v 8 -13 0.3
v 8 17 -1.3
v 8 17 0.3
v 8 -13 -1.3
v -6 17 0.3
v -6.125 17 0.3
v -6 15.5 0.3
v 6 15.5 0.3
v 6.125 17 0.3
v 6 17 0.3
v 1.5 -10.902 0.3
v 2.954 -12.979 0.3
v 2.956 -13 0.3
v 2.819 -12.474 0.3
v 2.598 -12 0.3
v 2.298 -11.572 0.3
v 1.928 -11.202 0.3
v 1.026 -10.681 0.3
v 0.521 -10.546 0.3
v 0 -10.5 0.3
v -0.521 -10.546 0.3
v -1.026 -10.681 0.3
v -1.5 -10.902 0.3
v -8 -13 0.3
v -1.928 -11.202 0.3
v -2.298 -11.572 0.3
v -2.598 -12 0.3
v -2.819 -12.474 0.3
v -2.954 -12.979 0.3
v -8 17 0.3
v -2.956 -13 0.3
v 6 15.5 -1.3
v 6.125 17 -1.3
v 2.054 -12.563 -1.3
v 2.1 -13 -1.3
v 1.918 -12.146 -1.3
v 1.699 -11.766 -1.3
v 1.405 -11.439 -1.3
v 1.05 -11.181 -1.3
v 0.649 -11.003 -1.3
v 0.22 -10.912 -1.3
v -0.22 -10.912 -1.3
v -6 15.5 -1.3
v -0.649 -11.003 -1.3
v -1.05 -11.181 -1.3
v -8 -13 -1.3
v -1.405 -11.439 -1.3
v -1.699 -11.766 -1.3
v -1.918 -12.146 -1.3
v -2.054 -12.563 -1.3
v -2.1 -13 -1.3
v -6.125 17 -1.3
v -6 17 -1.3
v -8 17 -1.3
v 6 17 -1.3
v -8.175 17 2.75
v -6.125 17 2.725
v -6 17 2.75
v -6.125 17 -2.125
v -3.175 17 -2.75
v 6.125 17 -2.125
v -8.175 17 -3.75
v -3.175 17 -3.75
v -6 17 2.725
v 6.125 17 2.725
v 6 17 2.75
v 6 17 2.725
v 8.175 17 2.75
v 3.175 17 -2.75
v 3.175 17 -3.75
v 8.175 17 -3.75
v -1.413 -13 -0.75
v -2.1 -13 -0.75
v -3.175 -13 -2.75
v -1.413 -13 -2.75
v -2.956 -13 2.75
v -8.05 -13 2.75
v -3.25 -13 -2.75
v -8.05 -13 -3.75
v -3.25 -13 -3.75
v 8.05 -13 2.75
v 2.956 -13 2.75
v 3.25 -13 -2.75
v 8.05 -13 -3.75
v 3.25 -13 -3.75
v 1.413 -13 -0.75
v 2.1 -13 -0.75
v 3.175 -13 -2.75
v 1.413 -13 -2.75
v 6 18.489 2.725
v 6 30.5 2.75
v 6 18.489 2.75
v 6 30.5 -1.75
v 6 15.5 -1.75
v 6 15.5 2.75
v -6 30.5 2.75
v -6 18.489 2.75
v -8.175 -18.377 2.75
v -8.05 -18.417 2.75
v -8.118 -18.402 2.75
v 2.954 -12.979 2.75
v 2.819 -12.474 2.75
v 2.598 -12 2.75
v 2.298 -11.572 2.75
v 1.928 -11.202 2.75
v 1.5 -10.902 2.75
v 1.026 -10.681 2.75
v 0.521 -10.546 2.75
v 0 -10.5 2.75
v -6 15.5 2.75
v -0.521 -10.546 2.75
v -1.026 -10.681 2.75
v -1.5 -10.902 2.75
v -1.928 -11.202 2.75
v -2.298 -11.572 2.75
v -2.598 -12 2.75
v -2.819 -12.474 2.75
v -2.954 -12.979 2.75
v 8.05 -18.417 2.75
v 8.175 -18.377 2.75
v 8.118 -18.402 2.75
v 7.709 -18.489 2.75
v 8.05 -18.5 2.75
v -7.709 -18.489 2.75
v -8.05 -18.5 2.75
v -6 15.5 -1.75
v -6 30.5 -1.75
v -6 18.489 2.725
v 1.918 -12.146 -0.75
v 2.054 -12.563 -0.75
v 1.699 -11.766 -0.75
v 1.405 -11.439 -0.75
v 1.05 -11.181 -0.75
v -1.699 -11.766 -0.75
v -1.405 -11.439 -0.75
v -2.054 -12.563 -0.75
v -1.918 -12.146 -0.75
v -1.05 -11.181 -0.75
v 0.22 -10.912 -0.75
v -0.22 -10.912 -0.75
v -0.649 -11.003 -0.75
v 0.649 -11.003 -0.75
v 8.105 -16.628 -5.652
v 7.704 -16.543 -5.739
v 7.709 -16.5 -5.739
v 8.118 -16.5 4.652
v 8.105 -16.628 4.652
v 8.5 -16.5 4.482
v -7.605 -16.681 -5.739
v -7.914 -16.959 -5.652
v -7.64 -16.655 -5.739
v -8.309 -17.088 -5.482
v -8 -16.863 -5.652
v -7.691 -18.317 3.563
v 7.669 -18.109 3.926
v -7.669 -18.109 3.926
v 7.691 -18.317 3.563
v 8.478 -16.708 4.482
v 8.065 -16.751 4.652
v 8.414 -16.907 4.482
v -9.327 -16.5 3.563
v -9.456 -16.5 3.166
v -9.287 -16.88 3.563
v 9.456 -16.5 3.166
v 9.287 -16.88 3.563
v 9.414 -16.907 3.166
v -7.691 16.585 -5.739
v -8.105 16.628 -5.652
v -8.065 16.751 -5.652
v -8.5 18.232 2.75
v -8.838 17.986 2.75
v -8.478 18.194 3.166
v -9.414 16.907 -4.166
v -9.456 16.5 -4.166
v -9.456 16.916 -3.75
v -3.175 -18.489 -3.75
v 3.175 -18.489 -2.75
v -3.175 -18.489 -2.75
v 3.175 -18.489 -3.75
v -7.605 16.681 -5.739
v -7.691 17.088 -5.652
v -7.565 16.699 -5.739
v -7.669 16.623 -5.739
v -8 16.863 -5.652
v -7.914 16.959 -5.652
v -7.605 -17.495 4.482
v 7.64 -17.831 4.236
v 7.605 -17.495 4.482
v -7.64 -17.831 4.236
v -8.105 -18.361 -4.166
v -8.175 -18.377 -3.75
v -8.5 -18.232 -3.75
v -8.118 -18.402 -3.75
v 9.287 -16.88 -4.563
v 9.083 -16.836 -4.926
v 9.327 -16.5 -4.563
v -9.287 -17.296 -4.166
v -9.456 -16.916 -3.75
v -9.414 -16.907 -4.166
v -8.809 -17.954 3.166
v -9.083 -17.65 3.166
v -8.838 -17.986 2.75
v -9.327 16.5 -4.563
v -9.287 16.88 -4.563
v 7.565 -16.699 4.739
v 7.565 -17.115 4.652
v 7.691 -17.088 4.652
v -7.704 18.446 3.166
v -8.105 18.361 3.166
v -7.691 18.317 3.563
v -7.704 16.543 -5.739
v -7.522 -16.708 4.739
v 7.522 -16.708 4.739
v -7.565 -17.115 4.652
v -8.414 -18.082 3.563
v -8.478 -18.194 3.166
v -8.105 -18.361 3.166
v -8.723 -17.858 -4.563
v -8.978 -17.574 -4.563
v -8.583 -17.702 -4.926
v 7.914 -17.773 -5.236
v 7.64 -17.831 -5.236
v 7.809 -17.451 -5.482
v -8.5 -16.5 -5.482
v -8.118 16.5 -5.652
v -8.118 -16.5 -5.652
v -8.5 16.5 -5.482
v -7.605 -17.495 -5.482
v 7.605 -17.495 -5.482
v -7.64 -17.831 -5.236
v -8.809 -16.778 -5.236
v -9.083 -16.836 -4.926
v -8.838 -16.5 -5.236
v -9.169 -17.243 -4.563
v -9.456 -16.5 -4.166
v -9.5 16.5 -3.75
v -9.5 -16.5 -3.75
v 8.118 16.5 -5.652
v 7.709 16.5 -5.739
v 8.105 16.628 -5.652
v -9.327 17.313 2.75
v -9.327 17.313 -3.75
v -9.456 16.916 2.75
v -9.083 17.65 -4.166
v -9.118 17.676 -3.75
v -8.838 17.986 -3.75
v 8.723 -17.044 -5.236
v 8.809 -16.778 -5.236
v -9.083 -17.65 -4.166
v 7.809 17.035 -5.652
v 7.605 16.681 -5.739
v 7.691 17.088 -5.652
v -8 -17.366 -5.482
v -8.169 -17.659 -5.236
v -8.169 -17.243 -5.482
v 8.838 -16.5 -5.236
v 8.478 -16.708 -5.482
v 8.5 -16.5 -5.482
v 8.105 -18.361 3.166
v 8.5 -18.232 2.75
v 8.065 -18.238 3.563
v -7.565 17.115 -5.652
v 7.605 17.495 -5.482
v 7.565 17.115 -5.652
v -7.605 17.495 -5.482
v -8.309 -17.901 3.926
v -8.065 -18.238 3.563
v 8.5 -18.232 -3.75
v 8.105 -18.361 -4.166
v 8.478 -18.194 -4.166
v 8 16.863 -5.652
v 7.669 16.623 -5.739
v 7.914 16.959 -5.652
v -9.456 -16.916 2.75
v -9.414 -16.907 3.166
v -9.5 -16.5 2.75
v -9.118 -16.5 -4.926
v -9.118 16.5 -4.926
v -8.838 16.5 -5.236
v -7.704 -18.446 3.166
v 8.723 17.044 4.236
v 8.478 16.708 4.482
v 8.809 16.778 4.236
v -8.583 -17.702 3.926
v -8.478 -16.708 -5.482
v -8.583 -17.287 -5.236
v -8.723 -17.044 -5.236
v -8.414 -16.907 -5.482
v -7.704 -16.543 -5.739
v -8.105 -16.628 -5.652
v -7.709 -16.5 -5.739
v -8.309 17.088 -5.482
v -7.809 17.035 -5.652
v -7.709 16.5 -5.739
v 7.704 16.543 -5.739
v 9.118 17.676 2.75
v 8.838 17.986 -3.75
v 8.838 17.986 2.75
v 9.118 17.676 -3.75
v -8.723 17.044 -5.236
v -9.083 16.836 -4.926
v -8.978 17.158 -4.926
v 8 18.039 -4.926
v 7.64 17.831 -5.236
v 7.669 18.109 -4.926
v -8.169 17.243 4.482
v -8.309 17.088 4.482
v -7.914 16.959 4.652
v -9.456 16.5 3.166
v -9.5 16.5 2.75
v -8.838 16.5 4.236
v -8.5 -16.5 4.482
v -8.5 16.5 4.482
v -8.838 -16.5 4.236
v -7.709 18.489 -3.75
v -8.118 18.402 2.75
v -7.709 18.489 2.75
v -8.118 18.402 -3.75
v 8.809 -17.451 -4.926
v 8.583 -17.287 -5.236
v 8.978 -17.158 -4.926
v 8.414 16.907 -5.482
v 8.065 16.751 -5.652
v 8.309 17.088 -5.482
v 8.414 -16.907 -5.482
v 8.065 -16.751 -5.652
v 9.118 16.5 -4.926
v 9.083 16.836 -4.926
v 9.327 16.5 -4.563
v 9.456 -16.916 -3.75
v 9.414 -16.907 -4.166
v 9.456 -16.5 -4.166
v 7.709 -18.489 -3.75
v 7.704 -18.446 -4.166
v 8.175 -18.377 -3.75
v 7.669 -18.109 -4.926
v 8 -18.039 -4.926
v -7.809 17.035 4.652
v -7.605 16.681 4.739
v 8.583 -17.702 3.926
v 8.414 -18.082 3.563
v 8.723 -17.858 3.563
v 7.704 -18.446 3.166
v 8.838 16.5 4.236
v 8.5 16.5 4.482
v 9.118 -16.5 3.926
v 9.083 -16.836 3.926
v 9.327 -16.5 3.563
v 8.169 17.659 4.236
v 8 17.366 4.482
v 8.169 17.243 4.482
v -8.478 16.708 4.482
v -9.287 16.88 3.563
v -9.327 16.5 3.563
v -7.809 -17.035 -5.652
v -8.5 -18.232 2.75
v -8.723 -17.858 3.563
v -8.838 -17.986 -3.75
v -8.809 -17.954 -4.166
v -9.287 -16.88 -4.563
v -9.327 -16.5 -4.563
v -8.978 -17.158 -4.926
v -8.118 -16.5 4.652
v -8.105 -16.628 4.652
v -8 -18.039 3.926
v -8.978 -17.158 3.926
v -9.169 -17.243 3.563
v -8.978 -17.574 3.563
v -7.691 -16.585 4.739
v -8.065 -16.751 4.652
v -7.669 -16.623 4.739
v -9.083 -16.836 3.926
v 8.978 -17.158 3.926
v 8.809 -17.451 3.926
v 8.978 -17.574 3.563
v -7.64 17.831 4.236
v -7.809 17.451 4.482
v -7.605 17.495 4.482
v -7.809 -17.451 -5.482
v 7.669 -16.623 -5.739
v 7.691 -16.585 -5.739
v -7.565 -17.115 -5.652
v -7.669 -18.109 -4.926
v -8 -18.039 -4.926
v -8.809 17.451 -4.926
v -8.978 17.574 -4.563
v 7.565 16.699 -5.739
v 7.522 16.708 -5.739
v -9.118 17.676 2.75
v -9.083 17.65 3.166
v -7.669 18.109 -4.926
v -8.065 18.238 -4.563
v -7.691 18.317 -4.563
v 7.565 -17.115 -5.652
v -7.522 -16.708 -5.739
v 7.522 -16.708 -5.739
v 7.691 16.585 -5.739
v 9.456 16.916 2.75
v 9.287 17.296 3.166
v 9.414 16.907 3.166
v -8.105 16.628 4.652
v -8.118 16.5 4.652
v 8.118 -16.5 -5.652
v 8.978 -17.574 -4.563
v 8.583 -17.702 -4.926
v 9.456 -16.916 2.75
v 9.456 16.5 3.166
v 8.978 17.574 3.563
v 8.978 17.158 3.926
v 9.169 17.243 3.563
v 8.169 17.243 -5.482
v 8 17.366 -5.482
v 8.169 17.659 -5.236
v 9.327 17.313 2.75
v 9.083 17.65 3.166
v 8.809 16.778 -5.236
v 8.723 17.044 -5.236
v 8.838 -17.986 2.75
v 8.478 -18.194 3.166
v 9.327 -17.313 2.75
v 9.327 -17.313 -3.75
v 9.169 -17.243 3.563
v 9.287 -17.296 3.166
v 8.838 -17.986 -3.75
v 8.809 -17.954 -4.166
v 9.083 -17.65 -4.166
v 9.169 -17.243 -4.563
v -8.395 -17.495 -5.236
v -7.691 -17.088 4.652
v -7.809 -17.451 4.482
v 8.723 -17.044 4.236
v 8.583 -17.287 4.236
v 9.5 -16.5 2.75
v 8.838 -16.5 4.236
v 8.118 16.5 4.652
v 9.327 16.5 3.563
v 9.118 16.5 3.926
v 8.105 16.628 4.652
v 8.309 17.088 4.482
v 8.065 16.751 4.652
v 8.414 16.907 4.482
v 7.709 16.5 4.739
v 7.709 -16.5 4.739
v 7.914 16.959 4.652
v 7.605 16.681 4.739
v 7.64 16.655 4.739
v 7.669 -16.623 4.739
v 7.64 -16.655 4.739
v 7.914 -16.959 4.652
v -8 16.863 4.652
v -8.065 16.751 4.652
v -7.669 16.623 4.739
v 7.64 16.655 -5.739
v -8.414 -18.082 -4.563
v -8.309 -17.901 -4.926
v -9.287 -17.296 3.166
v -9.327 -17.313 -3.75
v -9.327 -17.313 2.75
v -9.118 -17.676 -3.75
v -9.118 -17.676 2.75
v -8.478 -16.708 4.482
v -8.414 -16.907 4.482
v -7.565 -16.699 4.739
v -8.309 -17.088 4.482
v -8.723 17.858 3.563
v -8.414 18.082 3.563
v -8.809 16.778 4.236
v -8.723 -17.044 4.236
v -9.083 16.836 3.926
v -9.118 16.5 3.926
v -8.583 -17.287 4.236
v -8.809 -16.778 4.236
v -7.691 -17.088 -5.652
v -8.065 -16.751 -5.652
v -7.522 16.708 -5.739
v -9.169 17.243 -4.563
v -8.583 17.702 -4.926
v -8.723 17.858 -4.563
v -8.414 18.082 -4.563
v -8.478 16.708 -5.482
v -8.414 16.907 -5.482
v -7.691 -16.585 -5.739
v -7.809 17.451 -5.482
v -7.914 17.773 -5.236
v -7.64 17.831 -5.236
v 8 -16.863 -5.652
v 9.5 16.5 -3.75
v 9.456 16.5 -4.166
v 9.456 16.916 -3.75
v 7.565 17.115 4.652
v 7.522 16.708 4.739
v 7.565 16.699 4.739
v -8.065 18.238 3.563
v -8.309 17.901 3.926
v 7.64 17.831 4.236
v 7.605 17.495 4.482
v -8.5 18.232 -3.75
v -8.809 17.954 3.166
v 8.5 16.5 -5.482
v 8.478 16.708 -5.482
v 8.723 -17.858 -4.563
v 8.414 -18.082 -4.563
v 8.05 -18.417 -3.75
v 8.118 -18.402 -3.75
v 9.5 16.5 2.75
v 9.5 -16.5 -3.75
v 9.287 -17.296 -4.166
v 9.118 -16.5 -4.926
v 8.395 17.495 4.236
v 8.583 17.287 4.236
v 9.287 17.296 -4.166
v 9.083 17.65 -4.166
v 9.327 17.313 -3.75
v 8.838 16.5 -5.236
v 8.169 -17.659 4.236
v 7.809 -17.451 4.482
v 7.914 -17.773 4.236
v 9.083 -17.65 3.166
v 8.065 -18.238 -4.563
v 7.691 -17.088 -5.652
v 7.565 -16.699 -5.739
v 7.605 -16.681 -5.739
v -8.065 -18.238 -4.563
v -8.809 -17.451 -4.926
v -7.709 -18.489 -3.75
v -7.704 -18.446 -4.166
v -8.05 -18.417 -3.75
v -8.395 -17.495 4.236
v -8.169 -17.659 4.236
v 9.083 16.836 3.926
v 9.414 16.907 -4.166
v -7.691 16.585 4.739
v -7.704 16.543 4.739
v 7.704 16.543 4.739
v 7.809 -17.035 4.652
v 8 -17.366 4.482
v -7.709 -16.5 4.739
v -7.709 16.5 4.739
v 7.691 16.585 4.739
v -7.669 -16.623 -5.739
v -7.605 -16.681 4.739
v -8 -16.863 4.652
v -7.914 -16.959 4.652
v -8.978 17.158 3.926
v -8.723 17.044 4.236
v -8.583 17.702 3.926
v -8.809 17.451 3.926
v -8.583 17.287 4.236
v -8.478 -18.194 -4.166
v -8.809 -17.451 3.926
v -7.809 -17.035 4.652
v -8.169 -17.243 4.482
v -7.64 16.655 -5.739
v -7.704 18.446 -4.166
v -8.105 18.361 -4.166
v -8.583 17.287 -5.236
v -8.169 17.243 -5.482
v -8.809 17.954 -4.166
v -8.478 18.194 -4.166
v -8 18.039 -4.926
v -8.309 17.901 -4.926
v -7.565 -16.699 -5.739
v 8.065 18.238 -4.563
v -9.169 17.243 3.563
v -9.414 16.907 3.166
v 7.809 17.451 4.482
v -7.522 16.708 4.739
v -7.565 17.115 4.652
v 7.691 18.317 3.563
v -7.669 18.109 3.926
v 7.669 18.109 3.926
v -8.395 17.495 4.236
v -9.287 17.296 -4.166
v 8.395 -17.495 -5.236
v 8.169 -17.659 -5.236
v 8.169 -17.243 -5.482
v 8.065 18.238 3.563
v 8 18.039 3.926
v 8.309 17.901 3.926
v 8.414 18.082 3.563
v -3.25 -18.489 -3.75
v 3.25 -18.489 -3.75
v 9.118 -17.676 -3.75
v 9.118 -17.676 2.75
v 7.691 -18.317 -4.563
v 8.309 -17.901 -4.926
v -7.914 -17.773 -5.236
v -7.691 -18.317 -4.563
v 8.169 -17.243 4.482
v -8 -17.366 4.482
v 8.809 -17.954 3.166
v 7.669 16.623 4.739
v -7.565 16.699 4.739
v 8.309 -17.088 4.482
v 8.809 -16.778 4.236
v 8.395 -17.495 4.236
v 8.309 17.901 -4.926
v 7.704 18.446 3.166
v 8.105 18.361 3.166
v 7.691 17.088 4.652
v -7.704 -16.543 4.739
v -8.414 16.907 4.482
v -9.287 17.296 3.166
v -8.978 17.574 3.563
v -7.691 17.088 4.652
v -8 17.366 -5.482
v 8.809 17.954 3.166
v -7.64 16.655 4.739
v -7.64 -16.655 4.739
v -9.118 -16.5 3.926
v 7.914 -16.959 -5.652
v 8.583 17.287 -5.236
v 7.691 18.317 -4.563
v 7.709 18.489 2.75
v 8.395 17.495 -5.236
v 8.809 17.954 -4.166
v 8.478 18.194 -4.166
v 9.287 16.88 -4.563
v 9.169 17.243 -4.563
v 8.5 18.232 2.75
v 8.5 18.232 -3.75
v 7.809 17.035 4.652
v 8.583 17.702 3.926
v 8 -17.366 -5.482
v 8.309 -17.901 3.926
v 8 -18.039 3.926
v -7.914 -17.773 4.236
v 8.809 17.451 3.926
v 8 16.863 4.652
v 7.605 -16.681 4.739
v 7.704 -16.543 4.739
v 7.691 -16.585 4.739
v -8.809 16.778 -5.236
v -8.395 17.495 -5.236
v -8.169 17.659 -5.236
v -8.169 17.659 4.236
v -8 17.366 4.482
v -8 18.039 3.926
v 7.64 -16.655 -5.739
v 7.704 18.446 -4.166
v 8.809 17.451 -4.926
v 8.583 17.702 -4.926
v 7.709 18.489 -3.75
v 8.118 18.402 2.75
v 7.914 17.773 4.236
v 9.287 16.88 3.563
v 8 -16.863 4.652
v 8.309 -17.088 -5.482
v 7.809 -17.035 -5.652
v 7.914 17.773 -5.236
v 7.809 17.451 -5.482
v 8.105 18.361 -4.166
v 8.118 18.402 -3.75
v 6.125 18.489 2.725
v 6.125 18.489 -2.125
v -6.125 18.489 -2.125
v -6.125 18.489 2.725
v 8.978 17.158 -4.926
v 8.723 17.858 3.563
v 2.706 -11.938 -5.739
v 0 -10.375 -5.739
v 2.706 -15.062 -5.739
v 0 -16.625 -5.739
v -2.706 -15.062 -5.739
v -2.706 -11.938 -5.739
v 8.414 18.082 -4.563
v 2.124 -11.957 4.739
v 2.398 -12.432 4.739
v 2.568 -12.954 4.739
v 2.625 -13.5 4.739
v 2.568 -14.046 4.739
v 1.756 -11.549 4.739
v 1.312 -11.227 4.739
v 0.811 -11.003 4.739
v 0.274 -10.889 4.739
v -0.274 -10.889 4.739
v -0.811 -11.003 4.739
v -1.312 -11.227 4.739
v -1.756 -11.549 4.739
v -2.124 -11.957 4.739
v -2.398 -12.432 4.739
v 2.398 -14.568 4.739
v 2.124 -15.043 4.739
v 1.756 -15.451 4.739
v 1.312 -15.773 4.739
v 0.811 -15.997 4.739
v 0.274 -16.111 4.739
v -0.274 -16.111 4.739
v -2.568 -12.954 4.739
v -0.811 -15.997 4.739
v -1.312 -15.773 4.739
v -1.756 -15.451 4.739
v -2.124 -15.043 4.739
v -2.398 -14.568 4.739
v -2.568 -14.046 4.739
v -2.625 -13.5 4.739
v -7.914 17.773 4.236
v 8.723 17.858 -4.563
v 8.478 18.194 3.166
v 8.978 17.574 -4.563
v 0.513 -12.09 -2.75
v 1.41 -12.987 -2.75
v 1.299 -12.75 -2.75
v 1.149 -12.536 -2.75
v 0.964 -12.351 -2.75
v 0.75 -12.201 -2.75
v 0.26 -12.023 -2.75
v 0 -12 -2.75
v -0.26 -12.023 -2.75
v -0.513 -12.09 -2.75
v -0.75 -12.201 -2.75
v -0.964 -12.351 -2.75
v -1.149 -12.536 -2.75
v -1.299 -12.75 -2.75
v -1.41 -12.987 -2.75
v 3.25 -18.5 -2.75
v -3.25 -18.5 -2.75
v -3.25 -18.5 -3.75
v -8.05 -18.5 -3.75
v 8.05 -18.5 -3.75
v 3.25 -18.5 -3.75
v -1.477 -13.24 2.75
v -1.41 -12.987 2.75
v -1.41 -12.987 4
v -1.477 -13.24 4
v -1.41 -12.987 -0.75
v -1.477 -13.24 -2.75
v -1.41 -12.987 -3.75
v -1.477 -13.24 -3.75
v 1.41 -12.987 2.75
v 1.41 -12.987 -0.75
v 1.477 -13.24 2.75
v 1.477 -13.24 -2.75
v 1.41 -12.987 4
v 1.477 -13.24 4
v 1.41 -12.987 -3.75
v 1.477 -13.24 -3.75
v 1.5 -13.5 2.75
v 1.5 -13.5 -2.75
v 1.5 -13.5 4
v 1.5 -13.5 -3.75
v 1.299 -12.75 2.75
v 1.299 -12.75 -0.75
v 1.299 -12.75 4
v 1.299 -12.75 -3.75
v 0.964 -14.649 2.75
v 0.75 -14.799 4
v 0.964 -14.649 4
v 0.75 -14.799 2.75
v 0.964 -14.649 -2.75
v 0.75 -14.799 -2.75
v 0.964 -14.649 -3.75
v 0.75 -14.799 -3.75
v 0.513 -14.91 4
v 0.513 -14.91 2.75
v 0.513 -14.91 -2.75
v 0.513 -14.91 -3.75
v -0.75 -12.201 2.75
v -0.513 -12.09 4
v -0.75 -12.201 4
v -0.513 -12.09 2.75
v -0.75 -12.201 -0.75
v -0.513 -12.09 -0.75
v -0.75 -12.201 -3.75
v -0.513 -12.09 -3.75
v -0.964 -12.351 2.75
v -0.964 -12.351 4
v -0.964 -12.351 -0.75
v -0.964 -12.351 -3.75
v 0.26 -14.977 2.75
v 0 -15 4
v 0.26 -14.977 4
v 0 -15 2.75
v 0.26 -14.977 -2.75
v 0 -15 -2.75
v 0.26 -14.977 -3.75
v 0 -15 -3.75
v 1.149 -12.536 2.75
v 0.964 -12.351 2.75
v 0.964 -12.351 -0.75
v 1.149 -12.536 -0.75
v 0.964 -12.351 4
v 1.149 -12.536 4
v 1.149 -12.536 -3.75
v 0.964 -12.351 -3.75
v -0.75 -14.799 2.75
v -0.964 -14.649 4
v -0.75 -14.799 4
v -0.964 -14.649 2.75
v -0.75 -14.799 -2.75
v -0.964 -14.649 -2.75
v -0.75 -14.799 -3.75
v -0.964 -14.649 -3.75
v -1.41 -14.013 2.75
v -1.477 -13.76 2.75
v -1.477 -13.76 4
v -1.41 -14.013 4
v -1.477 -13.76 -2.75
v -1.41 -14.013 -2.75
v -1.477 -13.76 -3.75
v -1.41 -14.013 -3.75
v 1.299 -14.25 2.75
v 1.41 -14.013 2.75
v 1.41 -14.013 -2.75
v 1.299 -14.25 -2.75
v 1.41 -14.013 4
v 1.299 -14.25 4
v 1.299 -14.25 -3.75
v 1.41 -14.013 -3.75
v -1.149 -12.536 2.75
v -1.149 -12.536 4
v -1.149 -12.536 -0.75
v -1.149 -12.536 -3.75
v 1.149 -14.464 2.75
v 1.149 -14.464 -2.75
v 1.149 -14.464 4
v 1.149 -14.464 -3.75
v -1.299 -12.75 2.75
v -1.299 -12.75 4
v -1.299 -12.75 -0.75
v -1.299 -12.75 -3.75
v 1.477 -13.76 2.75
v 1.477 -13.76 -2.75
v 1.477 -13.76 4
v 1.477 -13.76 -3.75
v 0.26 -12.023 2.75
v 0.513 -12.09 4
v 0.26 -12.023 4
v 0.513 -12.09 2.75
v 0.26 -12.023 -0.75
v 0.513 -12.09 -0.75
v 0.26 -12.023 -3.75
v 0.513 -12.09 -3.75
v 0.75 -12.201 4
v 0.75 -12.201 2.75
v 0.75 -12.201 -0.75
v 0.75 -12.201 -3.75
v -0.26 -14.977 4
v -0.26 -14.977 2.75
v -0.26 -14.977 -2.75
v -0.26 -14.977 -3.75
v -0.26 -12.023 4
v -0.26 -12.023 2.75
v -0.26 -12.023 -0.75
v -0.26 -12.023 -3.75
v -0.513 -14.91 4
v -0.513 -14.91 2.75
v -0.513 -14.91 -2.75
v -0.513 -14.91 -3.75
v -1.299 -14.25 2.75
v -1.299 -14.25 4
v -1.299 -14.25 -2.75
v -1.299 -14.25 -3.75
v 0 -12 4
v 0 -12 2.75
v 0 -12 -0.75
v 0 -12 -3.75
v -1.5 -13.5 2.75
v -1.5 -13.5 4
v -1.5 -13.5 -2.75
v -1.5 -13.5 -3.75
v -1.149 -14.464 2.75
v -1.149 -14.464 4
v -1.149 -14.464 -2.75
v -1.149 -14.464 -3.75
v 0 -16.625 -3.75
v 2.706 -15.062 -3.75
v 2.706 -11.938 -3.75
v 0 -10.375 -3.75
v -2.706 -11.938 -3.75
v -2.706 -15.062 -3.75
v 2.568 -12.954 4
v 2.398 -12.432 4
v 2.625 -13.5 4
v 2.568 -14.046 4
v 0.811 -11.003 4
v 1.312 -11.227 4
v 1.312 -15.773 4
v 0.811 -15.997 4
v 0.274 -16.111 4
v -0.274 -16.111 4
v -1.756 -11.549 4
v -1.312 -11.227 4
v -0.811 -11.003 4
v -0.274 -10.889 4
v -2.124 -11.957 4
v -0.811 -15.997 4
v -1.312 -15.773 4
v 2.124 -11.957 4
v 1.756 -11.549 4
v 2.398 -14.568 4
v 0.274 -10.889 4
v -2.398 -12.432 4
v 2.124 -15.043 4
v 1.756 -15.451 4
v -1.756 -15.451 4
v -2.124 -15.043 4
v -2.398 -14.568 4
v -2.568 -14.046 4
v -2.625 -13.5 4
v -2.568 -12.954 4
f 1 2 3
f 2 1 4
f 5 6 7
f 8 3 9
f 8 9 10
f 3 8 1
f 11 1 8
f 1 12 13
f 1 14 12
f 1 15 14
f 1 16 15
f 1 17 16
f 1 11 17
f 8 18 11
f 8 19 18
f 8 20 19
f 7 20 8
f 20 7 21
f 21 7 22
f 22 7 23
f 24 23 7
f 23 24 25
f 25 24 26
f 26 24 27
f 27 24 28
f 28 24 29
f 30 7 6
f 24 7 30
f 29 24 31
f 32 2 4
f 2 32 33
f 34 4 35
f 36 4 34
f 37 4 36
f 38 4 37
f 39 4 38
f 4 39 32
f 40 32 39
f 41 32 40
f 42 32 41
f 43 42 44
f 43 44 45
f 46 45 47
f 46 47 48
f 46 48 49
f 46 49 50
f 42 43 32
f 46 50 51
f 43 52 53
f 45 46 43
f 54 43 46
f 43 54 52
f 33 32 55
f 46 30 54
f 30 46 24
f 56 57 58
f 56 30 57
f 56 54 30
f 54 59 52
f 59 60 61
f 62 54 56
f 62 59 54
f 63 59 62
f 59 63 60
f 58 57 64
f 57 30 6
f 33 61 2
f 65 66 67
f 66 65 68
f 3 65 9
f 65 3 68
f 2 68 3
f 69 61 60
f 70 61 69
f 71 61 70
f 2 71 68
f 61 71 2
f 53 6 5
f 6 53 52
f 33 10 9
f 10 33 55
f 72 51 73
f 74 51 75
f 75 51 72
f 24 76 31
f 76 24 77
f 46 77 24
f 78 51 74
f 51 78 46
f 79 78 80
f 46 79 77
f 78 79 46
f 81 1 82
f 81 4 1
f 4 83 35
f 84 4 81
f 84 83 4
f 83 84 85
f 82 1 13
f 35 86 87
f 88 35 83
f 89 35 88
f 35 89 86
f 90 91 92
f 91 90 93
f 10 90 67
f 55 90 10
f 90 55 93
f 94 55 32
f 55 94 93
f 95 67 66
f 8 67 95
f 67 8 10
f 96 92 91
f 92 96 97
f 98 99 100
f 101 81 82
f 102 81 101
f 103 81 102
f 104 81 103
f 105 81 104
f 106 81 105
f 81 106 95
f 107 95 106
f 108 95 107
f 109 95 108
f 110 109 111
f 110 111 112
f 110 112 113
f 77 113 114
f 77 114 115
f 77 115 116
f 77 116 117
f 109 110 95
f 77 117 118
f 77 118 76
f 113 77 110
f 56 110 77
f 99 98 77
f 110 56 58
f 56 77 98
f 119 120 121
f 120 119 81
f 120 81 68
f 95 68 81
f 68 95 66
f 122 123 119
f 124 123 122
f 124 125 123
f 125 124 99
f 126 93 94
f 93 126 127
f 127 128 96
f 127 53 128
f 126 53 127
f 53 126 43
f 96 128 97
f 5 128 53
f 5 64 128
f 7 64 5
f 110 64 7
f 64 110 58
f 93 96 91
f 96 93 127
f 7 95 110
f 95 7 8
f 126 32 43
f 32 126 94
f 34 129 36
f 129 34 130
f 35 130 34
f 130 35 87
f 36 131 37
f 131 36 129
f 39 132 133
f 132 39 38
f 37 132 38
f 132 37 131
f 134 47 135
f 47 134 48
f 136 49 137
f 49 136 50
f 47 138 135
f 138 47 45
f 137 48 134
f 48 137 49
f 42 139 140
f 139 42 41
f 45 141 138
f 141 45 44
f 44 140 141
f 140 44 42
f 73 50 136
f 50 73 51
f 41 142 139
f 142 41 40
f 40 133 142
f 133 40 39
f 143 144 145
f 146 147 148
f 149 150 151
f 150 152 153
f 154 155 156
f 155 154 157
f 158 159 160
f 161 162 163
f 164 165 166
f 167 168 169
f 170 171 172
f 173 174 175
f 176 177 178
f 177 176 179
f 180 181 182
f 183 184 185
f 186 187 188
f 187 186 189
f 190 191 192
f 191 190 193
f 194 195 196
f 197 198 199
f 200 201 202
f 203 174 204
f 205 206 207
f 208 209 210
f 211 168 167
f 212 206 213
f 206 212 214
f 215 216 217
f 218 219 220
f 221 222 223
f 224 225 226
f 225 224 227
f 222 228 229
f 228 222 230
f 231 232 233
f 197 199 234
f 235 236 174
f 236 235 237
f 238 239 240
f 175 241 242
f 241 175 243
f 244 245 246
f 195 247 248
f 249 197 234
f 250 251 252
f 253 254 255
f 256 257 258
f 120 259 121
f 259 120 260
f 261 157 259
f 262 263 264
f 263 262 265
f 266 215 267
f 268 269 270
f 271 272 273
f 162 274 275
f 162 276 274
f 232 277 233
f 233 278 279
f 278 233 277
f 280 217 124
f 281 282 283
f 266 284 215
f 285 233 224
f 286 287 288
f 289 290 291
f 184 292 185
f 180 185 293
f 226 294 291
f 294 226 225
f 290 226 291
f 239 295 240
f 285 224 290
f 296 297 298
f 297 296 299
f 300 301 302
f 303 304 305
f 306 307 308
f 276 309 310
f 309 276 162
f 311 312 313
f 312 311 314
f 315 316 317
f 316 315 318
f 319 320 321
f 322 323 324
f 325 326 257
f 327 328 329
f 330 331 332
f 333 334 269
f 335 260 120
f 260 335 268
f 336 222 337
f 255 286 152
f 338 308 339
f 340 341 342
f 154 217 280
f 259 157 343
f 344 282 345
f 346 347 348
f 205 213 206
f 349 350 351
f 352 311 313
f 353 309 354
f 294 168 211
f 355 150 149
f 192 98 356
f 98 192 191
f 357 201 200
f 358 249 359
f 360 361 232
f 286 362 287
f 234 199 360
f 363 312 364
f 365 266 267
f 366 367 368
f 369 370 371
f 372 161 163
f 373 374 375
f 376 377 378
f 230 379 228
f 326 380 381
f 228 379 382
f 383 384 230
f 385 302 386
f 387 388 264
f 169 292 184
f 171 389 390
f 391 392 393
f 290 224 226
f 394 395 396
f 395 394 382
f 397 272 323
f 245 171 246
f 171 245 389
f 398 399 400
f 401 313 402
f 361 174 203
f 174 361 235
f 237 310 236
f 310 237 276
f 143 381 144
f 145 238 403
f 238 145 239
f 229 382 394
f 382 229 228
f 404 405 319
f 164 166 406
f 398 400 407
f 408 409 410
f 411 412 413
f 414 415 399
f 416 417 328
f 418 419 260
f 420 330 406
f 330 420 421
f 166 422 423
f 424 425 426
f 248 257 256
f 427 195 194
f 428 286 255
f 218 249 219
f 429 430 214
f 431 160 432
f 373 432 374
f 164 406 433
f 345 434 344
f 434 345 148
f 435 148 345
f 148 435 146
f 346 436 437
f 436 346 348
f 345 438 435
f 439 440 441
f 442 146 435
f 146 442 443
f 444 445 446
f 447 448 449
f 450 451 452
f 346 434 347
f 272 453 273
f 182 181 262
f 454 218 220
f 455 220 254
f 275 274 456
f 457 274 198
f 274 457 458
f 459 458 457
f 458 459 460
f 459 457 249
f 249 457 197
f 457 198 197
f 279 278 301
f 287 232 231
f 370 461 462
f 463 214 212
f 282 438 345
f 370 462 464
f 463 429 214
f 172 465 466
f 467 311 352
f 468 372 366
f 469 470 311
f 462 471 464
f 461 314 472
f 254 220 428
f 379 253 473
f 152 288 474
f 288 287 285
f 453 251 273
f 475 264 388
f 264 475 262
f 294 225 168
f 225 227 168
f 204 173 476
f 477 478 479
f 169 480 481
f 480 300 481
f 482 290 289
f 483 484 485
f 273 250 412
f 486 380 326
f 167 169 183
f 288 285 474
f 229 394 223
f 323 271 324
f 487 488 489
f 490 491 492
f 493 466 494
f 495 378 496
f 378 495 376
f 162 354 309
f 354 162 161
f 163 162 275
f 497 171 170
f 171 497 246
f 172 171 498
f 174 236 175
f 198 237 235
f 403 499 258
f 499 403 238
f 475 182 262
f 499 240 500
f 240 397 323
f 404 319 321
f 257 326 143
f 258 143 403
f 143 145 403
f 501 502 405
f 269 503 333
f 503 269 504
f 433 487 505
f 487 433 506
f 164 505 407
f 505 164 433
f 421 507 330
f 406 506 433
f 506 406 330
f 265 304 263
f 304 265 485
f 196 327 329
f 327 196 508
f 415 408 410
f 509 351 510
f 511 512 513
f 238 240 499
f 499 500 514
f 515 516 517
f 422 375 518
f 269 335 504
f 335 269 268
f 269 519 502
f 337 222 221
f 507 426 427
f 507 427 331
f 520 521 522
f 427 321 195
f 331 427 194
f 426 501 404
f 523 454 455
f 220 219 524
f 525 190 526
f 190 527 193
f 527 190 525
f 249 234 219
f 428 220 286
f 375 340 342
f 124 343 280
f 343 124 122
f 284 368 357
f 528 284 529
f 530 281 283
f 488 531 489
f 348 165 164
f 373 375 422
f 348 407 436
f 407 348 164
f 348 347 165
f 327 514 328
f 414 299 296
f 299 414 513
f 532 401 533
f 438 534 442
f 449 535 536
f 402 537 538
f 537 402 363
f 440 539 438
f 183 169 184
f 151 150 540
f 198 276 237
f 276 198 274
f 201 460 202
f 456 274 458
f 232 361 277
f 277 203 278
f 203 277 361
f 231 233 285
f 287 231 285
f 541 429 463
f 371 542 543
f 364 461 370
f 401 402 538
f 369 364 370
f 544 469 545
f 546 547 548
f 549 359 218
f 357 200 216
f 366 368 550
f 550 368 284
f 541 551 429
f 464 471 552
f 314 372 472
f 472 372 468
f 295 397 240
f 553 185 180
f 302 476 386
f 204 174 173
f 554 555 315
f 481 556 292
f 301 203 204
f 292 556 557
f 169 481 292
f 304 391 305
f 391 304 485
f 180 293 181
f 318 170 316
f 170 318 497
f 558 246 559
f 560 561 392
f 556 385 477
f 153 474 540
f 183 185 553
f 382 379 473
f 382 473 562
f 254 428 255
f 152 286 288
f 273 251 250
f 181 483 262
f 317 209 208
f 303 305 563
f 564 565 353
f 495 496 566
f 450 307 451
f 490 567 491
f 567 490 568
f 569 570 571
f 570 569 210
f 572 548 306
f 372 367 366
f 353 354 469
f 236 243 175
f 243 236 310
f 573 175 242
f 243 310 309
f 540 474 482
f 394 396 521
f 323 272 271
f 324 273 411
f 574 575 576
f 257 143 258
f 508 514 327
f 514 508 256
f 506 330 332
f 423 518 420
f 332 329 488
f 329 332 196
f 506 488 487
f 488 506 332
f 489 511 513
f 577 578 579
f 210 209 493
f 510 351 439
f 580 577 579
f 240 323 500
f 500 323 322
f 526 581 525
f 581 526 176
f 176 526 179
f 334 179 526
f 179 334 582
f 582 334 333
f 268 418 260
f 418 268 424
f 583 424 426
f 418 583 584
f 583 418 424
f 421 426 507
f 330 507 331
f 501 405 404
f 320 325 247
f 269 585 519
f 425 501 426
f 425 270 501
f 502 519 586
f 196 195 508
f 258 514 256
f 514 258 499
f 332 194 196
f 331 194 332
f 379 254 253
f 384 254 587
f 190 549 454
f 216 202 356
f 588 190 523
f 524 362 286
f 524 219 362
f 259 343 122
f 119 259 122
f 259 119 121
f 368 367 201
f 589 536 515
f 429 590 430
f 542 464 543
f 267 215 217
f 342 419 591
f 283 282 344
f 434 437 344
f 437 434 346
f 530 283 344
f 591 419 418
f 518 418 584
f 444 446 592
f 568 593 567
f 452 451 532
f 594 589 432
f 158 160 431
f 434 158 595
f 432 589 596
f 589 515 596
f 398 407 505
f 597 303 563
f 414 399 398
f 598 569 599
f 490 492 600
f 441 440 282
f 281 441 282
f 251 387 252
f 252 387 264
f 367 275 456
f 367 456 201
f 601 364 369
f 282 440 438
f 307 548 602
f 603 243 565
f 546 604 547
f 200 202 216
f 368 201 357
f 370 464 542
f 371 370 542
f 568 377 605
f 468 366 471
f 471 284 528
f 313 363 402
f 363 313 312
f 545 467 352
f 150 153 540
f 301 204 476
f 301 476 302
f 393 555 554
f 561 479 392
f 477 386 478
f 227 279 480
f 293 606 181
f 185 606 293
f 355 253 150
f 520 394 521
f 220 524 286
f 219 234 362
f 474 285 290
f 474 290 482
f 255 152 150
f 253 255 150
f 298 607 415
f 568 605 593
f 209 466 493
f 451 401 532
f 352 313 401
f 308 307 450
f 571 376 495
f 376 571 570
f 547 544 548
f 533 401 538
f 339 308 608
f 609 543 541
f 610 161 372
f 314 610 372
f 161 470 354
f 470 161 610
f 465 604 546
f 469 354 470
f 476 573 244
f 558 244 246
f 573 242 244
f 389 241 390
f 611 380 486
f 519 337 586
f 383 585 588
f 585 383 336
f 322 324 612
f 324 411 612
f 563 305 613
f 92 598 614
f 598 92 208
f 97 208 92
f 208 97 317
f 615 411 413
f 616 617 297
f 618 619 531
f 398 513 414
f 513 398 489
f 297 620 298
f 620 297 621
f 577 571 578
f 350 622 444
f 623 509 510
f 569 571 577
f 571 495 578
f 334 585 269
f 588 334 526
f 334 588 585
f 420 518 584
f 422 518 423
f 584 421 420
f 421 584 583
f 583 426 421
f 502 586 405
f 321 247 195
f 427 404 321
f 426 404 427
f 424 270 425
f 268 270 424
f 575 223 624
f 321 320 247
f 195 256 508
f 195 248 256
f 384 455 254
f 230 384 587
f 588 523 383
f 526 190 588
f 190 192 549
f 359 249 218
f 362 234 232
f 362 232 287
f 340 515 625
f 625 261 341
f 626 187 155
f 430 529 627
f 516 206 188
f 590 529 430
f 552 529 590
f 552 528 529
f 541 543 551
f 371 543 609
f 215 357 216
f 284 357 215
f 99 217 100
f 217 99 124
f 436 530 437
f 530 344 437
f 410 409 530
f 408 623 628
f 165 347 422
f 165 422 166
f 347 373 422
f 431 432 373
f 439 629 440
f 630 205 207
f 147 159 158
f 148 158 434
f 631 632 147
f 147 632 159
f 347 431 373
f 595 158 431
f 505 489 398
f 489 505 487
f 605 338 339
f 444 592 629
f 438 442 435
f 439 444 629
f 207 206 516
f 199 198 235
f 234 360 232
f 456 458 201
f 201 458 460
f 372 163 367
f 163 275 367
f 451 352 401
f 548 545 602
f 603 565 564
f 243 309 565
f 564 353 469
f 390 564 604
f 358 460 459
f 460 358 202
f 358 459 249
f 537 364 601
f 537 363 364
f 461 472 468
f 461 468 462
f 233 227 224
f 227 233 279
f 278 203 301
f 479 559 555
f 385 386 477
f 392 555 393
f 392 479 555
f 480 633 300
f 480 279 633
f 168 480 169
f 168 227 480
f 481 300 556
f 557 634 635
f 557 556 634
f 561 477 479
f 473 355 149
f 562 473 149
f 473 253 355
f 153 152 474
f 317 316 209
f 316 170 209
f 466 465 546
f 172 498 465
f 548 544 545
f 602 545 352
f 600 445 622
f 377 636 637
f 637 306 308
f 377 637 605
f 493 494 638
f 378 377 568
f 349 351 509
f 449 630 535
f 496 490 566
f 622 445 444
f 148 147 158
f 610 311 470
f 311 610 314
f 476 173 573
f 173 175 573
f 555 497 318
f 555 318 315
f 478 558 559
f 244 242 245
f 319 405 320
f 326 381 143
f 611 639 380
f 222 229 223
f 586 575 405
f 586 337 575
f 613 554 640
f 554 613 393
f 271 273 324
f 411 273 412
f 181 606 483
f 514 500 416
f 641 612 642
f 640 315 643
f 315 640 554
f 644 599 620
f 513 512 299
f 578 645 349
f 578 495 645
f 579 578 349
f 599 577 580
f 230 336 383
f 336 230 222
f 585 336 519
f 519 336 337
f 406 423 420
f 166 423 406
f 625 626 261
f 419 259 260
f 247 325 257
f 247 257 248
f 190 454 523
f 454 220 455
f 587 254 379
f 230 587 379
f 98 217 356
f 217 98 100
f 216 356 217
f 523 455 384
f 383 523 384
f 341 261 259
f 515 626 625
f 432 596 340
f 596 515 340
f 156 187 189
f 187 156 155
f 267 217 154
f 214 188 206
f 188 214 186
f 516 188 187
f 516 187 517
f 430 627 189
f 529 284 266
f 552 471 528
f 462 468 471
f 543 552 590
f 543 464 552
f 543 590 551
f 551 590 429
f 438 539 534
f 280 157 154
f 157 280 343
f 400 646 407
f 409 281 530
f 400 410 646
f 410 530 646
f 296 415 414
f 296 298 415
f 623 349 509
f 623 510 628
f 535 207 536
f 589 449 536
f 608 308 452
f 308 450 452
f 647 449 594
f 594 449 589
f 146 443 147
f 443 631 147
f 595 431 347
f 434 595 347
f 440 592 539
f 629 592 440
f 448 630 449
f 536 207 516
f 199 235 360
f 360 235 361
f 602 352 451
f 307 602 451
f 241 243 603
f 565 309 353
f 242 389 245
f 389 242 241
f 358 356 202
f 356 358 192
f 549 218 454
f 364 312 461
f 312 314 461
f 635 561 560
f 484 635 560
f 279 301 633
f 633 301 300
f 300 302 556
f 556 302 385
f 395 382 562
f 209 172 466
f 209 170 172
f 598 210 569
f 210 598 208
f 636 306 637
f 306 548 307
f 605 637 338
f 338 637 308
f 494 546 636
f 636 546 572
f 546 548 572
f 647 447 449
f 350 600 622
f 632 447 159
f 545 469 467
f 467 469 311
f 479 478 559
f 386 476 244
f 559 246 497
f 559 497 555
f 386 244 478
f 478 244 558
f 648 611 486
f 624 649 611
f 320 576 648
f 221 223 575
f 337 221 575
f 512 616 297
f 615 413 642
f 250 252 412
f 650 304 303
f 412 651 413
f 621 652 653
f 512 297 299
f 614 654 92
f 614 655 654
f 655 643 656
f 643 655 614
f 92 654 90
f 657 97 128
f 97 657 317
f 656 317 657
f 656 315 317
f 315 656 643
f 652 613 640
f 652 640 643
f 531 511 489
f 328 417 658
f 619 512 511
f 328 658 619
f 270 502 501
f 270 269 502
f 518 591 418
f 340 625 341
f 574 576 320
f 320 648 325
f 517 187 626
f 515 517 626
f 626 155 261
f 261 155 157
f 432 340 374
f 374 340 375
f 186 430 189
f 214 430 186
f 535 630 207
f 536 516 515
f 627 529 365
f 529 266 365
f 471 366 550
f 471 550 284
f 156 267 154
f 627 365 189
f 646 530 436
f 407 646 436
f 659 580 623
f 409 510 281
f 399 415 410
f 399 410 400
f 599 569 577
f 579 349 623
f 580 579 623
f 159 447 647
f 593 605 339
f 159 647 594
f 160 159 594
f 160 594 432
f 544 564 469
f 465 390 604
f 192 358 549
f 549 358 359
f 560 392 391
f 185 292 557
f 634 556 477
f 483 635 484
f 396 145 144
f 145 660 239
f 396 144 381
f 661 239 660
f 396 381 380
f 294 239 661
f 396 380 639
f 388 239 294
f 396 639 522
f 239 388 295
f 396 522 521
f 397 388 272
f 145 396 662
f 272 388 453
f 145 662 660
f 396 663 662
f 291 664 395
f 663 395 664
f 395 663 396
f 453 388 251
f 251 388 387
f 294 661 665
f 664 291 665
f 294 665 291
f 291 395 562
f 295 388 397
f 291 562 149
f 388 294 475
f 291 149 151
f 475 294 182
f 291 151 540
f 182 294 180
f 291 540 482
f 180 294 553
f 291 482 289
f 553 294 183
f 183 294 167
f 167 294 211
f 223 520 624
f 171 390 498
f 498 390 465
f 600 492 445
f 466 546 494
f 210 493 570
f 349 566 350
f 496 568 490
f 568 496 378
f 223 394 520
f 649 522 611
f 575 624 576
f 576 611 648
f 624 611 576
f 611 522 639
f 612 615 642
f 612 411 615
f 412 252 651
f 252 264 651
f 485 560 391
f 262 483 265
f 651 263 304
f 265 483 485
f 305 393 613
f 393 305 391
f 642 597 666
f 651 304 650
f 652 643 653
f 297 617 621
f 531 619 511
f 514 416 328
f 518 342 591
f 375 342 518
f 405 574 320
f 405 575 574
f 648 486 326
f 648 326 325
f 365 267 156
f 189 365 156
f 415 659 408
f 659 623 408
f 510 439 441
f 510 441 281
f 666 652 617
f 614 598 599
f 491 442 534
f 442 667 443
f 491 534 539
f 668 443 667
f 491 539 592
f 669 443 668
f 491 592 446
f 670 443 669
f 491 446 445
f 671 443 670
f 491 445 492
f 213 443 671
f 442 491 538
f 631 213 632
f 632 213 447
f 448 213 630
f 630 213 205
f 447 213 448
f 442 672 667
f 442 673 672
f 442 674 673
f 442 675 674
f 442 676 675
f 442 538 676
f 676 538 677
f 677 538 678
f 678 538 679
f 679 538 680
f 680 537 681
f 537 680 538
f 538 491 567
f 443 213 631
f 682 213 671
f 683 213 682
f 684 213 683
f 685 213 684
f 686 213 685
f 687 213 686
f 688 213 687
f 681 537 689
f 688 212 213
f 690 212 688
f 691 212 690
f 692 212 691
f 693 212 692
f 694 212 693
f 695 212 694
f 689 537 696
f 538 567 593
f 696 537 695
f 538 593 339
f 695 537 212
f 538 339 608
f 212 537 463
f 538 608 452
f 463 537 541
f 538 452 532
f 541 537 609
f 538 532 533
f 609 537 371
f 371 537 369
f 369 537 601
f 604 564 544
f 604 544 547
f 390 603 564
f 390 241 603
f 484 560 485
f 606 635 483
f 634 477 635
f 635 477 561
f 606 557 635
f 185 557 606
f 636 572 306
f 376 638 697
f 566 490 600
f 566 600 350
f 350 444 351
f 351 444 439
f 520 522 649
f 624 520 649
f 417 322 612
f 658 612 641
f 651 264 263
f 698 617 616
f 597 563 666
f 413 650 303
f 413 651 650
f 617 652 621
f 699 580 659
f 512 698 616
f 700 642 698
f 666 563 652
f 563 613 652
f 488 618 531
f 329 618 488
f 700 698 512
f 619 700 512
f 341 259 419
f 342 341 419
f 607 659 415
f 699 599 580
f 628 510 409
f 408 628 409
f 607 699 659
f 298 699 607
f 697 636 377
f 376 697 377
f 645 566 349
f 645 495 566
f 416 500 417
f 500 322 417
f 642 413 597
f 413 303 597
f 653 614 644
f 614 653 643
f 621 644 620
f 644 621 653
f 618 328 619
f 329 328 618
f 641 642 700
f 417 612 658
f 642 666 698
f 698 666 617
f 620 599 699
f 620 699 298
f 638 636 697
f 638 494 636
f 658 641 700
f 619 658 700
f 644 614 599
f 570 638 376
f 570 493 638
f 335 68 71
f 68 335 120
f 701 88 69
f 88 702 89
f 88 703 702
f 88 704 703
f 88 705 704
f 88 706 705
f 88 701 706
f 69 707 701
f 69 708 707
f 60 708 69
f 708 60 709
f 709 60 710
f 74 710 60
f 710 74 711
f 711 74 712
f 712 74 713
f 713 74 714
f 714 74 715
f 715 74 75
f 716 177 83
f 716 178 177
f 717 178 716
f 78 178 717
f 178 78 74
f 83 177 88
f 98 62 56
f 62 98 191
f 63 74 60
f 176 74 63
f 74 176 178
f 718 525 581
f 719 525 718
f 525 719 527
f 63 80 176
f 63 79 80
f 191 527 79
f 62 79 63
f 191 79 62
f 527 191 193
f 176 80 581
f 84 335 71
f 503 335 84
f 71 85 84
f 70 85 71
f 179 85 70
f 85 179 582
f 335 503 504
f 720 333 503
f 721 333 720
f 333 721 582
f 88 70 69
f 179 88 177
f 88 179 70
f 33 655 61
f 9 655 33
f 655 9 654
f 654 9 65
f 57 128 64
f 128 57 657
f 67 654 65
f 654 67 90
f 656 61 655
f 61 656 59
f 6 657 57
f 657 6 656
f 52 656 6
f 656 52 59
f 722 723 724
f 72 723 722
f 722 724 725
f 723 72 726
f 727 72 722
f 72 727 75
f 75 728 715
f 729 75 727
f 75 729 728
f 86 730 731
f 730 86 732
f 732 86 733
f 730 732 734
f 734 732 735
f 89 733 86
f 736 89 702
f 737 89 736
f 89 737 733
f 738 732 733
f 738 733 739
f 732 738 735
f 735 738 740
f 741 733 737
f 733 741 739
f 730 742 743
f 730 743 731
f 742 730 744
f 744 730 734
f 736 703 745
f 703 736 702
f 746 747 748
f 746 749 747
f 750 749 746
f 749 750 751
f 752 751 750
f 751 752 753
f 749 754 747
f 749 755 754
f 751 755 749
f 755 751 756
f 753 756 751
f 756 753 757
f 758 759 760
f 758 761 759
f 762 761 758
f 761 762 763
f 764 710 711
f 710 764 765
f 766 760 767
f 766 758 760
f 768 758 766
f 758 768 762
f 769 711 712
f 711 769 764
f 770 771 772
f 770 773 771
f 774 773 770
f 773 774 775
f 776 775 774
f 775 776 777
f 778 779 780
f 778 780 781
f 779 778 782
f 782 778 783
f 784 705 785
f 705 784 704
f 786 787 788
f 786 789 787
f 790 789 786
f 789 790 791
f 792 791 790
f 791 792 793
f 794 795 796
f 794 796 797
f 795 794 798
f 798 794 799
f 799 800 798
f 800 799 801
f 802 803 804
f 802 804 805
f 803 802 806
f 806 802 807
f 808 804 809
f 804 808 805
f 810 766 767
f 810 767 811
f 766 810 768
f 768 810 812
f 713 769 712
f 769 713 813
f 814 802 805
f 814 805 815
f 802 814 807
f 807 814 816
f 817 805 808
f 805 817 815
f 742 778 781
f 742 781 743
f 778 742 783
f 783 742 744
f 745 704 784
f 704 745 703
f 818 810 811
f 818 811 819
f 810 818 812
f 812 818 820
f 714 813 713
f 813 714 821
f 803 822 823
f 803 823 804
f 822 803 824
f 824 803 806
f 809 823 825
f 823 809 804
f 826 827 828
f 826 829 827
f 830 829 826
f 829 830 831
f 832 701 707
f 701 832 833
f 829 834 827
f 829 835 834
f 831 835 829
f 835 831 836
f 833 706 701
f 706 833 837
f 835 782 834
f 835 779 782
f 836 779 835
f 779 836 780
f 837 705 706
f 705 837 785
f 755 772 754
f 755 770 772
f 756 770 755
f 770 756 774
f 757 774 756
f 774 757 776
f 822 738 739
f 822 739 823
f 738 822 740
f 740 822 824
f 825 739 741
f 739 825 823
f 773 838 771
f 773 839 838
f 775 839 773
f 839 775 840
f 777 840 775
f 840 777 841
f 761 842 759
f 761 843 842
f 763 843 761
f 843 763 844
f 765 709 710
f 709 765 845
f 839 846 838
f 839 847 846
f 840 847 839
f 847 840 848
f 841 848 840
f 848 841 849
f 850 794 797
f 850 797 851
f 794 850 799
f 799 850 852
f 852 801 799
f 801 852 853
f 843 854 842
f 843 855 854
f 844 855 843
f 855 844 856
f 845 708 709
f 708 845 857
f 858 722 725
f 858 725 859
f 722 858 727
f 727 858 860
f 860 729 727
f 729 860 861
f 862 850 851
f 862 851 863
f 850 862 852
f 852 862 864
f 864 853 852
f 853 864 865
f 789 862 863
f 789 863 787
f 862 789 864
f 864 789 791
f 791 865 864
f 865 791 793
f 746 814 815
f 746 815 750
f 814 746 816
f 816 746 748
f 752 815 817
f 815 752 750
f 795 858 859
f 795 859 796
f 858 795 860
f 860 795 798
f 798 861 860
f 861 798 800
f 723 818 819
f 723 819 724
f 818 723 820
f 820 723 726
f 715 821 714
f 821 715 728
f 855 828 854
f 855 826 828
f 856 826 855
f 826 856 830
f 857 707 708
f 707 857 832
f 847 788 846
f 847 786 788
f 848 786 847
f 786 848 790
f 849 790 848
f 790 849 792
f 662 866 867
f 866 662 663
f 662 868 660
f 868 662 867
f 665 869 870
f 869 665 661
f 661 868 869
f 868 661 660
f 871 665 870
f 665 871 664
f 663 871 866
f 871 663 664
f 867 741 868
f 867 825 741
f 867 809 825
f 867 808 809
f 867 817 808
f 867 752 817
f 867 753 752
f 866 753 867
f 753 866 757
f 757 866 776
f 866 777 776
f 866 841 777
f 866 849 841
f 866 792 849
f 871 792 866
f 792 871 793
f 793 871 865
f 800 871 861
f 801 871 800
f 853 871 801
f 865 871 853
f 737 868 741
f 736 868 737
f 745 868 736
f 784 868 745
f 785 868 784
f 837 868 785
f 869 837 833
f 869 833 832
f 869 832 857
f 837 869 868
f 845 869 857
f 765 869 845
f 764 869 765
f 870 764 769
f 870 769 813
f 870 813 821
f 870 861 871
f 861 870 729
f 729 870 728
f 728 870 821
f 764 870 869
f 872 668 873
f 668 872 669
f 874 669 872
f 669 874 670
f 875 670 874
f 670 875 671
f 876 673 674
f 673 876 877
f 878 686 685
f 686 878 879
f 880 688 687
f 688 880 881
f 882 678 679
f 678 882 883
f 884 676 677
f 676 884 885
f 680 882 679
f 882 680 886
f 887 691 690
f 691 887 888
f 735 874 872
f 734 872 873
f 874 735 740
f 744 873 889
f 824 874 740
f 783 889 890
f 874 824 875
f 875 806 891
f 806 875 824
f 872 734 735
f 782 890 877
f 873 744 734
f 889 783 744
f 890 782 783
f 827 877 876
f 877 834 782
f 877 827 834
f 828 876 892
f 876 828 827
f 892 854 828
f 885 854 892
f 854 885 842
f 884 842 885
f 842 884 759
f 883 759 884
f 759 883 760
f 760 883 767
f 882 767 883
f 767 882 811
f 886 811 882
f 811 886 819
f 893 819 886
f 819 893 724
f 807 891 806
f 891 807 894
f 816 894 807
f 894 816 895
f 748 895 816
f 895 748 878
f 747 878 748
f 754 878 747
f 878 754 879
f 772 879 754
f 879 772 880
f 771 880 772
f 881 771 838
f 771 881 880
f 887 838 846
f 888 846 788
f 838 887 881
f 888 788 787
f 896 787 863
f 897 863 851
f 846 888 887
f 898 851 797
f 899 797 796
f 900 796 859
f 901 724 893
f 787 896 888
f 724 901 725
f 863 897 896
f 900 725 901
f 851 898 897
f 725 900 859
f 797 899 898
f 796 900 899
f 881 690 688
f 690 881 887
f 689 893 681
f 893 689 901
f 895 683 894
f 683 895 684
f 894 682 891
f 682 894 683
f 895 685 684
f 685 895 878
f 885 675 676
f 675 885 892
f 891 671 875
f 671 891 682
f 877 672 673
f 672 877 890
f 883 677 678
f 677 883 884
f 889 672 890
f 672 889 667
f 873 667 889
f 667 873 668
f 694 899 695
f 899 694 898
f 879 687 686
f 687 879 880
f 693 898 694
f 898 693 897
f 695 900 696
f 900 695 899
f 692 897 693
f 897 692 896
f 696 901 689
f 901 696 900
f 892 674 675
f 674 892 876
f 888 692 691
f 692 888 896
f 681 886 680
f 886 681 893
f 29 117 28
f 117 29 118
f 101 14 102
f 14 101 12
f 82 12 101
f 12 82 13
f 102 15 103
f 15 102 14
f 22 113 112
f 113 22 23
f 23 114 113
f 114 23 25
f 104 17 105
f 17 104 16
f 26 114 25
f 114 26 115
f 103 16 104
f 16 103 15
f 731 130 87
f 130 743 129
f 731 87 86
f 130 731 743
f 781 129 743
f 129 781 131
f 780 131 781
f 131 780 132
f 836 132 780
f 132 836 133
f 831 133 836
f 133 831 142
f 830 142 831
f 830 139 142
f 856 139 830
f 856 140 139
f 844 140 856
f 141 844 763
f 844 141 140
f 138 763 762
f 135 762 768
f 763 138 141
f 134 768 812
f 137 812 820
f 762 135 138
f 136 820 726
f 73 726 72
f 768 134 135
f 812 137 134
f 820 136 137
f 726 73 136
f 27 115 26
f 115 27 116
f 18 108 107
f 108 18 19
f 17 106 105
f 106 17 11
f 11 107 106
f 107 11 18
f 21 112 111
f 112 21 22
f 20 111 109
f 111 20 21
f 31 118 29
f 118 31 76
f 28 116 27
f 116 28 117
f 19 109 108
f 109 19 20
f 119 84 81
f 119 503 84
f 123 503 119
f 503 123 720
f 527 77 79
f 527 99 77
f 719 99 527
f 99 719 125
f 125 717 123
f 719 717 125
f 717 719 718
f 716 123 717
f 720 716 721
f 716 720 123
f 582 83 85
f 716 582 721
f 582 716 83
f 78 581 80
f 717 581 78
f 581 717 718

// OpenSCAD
/*
 * Blaustahl Case Neu Edition
 * Copyright (c) 2025 Lone Dynamics Corporation. All rights reserved.
 *
 * required hardware:
 *  - 1 x M2.5 x 10mm countersunk bolt
 *  - 1 x M2.5 nut
 *
 */
 
$fn = 30;

box_width = 19;
box_length = 37;
box_height = 10.5;
box_thickness = 2.0;

lid_thickness = 3;

cutout_width = 16.10;
cutout_length = 44;
cutout_height = 5.5;

cutout_usb_width = 12;

board_height = 1.4;

roundness = 2;

toladj = 0.25;

ldp_board(-0.5);
translate([0,0,-0.5]) ldp_case();
translate([0,0,-0.25]) ldp_endcap();

// m2.5 bolt
//translate([0,-13.5,-6.25]) color([1,0,0]) cylinder(d=2.5, h=12, $fn=36);

// m2.5 nut
//translate([0,-13.5,-6.55]) rotate(30) color([1,0,0]) cylinder(d=5.8, h=2.4, $fn=6);

module ldp_endcap()
{
    		 	
	difference() {
		union() {
			translate([0,-13.5,-0.5]) color([0,0,1]) cylinder(d=6, h=3.5, $fn=36);
			translate([0,-15.75,-0.25]) cube([16.1,5.5,6.5], center=true);
		}
		translate([0,-13.5,-4.25]) color([1,0,0]) cylinder(d=3, h=8, $fn=36);
        color([1,0,0]) translate([0,0,-5.5]) cube([6.5,100,6], center=true);

	}
}

module ldp_board(o)
{

	difference() {
		union() {
			translate([0,2,o])
				color([0.0,0.8,0.0]) cube([16, 30, 1.6], center=true);
			translate([0,23,o+1])
				color([0.9,0.9,0.9]) cube([12, 15, 4.5], center=true);
		}
		translate([0,-13,-10]) cylinder(d=4.2, h=100);

	}
	
}

module ldp_case()
{

	difference() {
		
		minkowski() {
			cube([box_width-(roundness*2),box_length-(roundness*2),box_height-(roundness*2)],
				center=true);
			sphere(roundness);
		}	
        
		translate([0,-5,(box_height-cutout_height)/2-2])
			cube([cutout_width+toladj,cutout_length,cutout_height], center=true);

		translate([-5.675,-5,(box_height-cutout_height)/2-3])
			cube([5,cutout_length,cutout_height], center=true);
		
		translate([5.675,-5,(box_height-cutout_height)/2-3])
			cube([5,cutout_length,cutout_height], center=true);

		// USB cutout
        translate([0,15,0.8])
            cube([cutout_usb_width+toladj,10,4.6+toladj], center=true);
        
		// bolt hole
		translate([0,-13.5,-5]) cylinder(d=2.75+toladj, h=100, $fn=36);
		
		// nut cutout
		translate([0,-13.5,-5.75]) rotate(30) cylinder(d=6+toladj, h=2.5, $fn=6);
    
        // lid notch cutout
        translate([0,-13.5,4.5]) cylinder(d=5+toladj, h=100);

//        translate([-1.5,2.5,5.1]) rotate([0,0,270])
//            linear_extrude(0.3)
//                text("BLAUSTAHL", size=3, halign="center", font="Lato Black");

	}

}
